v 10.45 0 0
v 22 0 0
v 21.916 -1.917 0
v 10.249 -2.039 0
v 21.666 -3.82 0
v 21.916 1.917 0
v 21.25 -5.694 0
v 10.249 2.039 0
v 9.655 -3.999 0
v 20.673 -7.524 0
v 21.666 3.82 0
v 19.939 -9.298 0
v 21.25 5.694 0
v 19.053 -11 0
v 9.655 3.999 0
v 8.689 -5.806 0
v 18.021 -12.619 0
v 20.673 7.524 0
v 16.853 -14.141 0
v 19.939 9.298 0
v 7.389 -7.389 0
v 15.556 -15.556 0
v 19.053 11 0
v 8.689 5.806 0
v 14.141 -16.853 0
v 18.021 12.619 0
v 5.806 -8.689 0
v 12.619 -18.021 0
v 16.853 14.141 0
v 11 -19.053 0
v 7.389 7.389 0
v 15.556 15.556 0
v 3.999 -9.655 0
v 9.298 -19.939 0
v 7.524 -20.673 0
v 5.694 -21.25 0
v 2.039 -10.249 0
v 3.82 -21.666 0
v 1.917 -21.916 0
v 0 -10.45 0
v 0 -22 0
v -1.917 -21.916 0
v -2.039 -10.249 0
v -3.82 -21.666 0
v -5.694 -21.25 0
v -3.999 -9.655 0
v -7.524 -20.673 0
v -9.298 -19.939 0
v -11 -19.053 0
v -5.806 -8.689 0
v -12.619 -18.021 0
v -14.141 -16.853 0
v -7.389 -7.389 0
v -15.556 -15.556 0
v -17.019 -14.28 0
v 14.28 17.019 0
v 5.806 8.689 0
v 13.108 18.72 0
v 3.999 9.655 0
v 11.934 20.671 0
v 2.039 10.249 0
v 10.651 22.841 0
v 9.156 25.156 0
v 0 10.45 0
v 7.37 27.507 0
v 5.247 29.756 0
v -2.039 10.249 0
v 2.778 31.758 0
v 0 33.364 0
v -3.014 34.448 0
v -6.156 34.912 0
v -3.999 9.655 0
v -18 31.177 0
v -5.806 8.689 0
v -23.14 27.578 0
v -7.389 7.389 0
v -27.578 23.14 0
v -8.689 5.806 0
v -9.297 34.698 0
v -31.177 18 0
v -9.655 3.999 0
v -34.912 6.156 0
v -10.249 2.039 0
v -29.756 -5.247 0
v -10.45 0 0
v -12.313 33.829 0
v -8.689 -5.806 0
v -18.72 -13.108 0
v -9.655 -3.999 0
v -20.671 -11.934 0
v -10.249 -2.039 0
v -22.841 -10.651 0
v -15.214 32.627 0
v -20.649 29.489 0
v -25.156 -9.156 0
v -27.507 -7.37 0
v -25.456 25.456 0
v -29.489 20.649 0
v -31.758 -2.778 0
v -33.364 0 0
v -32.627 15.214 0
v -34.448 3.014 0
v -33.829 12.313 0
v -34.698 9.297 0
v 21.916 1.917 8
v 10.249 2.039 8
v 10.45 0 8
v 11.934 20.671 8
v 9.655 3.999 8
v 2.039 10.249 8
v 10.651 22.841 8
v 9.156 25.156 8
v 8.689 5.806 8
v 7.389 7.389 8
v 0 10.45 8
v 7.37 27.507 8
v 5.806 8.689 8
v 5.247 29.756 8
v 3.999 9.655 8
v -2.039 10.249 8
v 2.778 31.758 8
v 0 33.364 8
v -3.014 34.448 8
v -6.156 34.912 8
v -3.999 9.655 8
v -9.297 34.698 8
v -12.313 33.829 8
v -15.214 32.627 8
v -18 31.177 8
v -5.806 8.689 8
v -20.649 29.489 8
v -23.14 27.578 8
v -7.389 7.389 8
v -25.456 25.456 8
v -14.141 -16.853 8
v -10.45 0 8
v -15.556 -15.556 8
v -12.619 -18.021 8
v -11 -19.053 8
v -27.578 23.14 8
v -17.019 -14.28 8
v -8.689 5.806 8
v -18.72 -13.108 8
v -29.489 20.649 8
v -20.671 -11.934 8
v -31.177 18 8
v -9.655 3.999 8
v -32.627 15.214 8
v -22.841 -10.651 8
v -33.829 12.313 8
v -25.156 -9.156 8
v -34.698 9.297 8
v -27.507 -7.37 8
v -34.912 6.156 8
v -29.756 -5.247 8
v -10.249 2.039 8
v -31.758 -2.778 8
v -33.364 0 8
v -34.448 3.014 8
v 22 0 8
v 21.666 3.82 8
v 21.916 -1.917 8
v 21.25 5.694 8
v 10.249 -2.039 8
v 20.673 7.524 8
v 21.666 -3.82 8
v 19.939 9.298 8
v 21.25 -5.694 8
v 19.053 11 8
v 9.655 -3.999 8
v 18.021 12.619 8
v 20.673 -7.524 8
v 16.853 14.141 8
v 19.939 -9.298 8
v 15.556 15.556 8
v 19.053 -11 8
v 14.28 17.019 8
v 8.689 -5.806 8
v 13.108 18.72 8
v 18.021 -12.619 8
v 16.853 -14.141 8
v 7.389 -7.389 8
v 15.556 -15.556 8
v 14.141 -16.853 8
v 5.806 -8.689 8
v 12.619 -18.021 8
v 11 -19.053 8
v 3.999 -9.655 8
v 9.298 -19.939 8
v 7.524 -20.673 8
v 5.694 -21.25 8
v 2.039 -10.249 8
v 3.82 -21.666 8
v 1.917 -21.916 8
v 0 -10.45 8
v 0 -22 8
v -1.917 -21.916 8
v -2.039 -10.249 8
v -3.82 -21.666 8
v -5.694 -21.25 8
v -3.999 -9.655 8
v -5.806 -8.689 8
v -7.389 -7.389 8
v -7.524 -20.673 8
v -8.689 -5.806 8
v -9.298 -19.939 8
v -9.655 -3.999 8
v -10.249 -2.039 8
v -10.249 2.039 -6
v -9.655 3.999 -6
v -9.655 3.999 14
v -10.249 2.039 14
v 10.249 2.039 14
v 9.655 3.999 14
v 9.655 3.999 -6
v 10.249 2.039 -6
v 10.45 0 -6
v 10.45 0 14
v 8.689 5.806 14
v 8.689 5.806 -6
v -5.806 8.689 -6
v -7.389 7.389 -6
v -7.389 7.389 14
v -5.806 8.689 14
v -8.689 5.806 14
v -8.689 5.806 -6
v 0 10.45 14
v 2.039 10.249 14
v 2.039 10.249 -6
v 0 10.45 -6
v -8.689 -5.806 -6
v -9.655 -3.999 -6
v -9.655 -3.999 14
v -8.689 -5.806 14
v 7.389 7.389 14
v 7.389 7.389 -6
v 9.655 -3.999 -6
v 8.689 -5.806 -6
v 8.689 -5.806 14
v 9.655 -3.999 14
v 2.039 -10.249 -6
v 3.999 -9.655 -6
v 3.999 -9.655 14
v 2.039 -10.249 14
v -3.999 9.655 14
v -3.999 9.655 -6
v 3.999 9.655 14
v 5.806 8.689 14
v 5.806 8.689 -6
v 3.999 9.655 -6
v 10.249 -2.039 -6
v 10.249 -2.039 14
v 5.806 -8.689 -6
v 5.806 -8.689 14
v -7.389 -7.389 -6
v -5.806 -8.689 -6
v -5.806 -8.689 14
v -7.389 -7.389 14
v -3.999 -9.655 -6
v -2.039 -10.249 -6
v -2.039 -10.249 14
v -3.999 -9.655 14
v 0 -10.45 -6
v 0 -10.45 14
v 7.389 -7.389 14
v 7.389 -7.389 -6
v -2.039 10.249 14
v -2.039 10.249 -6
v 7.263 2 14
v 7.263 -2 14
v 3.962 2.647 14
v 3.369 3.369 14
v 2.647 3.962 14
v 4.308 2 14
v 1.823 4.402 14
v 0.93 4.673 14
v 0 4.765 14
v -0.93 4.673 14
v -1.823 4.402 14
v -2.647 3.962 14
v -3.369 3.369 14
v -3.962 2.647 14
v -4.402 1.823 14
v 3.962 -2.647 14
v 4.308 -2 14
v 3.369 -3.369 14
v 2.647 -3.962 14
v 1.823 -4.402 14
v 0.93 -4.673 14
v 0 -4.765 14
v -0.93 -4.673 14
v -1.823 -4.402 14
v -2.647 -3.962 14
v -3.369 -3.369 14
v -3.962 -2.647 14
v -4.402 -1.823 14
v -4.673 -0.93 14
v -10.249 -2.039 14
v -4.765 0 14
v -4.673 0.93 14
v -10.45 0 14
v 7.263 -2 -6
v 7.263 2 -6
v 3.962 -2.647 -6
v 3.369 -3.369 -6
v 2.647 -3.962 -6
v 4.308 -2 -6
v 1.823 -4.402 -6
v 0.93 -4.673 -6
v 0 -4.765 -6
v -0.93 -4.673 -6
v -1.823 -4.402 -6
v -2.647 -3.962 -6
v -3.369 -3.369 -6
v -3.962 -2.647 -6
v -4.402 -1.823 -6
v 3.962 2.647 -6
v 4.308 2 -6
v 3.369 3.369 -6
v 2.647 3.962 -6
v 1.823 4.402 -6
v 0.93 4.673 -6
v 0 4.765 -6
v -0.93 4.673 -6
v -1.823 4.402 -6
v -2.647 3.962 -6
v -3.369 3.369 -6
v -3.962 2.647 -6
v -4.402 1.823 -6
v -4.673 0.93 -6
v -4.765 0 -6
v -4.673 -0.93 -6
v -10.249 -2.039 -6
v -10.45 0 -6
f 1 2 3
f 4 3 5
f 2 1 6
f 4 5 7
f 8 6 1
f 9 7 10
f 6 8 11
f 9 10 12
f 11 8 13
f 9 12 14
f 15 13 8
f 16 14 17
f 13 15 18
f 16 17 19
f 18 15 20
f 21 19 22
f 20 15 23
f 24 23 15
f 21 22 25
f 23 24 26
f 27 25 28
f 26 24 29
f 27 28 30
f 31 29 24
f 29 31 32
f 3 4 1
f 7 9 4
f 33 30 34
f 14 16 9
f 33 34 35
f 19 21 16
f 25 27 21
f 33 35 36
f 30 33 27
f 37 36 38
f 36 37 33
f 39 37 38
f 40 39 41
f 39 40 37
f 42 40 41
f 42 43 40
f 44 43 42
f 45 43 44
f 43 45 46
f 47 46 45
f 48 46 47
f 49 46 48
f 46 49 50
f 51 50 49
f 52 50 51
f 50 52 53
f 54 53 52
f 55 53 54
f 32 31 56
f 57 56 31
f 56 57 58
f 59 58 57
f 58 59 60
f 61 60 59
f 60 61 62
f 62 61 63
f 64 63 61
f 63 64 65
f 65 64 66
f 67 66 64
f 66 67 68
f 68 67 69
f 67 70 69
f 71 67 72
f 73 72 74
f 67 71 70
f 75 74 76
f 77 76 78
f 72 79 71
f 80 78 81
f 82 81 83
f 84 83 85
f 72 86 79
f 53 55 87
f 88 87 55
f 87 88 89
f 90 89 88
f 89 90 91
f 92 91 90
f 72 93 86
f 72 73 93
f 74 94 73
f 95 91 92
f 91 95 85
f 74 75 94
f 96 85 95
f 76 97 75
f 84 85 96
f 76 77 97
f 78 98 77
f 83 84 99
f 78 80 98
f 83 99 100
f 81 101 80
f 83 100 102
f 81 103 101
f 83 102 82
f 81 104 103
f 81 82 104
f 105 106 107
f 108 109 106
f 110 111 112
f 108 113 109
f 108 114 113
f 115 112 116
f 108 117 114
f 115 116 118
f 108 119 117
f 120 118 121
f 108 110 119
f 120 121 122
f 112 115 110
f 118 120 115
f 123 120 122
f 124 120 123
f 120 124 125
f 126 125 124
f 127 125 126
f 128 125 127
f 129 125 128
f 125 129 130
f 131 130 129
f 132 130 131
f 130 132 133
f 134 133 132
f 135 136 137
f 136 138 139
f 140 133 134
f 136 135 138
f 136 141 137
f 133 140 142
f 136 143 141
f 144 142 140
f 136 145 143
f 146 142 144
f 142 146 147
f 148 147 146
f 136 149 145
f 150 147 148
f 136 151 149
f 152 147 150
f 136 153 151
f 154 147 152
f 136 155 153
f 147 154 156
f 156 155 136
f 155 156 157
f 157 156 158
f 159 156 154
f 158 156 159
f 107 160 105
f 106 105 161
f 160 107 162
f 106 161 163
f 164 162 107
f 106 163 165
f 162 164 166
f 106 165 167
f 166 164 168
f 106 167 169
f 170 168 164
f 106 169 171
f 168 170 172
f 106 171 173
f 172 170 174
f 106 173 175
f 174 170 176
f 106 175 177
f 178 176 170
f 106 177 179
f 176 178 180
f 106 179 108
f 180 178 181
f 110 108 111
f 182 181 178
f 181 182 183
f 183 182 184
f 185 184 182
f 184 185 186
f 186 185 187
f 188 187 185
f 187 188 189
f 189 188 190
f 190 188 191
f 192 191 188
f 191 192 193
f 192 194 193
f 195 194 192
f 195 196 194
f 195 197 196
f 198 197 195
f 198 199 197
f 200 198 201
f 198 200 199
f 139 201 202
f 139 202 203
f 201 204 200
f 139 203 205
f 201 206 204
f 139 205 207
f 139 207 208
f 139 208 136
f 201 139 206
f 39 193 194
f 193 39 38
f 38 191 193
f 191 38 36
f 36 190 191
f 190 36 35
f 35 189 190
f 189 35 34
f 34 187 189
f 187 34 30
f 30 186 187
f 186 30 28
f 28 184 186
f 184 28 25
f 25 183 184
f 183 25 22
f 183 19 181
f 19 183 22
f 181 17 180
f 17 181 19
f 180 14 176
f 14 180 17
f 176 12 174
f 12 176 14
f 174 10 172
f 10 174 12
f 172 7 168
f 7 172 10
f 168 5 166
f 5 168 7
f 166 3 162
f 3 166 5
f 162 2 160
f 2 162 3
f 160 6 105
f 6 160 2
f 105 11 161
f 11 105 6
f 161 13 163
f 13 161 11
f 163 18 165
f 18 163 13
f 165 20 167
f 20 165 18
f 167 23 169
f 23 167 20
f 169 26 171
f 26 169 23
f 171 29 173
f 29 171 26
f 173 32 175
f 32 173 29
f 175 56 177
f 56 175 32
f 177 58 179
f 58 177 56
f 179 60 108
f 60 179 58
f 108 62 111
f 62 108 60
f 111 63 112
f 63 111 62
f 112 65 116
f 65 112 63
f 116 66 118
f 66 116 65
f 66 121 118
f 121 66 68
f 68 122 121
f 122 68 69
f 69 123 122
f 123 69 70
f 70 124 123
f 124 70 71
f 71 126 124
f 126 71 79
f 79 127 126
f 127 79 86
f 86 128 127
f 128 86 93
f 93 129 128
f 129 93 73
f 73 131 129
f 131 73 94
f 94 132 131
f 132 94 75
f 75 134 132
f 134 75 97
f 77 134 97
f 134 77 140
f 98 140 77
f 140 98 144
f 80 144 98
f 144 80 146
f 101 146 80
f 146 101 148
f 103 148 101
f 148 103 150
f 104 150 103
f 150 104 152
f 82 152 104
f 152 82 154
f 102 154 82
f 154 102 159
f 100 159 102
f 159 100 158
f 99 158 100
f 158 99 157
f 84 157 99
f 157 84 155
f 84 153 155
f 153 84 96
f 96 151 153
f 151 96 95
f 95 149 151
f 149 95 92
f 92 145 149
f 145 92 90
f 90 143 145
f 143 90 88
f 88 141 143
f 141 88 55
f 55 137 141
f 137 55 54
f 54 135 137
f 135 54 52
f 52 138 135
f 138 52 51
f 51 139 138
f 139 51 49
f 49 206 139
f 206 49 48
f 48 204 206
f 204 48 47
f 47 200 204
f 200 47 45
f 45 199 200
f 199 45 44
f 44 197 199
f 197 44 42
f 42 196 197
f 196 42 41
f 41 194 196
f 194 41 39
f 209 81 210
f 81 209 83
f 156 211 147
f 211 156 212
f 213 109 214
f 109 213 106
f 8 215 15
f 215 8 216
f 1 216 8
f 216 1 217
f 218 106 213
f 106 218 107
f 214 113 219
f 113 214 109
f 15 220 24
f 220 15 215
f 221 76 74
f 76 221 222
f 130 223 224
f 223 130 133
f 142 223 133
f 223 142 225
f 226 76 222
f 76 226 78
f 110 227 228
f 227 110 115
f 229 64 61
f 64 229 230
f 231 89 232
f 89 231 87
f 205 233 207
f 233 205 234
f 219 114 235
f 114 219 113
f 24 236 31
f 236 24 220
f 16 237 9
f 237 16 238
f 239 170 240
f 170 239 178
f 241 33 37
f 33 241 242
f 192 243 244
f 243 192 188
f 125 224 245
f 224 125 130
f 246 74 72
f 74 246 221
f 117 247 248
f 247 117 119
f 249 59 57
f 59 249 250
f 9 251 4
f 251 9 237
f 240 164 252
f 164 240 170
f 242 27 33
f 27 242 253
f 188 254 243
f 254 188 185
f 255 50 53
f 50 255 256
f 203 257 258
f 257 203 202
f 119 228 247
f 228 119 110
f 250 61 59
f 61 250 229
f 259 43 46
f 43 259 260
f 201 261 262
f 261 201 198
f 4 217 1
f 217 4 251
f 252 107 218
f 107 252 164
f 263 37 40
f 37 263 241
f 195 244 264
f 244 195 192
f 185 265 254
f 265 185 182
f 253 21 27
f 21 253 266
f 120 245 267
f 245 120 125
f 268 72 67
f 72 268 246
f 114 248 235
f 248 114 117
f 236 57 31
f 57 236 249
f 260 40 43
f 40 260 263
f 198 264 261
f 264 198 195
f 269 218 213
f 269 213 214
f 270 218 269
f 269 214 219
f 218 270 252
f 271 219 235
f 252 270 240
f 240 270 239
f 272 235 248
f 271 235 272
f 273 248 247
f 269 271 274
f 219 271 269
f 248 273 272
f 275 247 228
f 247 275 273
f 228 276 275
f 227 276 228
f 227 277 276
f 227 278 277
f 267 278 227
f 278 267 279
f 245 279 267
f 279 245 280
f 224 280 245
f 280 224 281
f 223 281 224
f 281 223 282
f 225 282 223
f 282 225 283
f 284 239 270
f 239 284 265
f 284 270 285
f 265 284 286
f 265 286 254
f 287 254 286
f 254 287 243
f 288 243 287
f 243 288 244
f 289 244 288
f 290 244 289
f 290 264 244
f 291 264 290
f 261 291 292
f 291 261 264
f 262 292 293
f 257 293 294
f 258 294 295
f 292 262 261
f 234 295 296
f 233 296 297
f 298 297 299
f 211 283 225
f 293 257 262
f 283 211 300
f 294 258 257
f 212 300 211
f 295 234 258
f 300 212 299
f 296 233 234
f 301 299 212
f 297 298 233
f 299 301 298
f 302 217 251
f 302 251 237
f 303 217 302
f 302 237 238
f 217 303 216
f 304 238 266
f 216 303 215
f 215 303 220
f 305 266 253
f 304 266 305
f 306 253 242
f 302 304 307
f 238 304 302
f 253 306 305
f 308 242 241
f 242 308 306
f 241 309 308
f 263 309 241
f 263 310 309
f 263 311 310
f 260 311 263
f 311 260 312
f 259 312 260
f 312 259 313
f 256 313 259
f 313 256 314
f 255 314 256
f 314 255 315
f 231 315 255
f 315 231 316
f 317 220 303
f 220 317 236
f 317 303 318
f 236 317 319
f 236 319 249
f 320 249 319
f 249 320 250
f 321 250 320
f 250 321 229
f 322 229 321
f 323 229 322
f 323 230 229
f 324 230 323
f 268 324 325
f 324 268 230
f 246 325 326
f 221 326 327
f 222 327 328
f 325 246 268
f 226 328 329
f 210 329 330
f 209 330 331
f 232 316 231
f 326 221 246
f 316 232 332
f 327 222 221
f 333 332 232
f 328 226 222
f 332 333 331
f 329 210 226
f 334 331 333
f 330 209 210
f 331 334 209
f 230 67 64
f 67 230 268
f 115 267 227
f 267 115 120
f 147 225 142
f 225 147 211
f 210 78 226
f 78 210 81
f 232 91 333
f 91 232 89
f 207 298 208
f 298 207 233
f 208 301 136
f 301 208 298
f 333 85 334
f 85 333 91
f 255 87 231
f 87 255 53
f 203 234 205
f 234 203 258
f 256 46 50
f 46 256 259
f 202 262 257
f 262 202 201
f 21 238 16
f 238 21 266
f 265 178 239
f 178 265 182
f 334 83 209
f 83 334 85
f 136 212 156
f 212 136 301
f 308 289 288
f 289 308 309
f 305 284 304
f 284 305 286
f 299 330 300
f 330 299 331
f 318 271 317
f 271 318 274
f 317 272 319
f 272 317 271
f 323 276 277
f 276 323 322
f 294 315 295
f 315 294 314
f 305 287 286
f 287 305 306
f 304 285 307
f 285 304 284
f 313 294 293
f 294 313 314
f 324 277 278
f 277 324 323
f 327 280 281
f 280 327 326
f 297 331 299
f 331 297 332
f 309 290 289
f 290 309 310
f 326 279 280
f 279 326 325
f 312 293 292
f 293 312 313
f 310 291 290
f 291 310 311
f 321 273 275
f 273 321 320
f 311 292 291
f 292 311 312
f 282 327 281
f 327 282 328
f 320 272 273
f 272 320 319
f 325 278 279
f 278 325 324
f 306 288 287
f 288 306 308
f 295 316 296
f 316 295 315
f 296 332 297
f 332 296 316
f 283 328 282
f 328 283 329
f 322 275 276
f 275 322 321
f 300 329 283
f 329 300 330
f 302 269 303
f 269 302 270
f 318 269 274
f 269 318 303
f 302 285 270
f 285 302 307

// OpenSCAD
$fn = 32;

// ----------------------------------------------------------------------
// Cam: base radius 22 mm with a 14 mm lift over 180 degrees
// ----------------------------------------------------------------------

// --- parameters (mm) ---
base_r = 22;              // base radius
lift = 14;                // lift height above the base radius
lift_span = 180;          // angular width of the lift
lift_start = 45;          // angle where the lift starts
cam_t = 8;                // cam plate thickness
hub_d = 20.9;             // hub diameter
hub_h = 20;               // hub height
bore_d = 9.53;            // bore
key_w = 4;                // keyway width
key_depth = 2;            // keyway depth

cam_profile = [[22, 0], [21.916, 1.917], [21.666, 3.82], [21.25, 5.694], [20.673, 7.524], [19.939, 9.298], [19.053, 11], [18.021, 12.619], [16.853, 14.141], [15.556, 15.556], [14.28, 17.019], [13.108, 18.72], [11.934, 20.671], [10.651, 22.841], [9.156, 25.156], [7.37, 27.507], [5.247, 29.756], [2.778, 31.758], [0, 33.364], [-3.014, 34.448], [-6.156, 34.912], [-9.297, 34.698], [-12.313, 33.829], [-15.214, 32.627], [-18, 31.177], [-20.649, 29.489], [-23.14, 27.578], [-25.456, 25.456], [-27.578, 23.14], [-29.489, 20.649], [-31.177, 18], [-32.627, 15.214], [-33.829, 12.313], [-34.698, 9.297], [-34.912, 6.156], [-34.448, 3.014], [-33.364, 0], [-31.758, -2.778], [-29.756, -5.247], [-27.507, -7.37], [-25.156, -9.156], [-22.841, -10.651], [-20.671, -11.934], [-18.72, -13.108], [-17.019, -14.28], [-15.556, -15.556], [-14.141, -16.853], [-12.619, -18.021], [-11, -19.053], [-9.298, -19.939], [-7.524, -20.673], [-5.694, -21.25], [-3.82, -21.666], [-1.917, -21.916], [0, -22], [1.917, -21.916], [3.82, -21.666], [5.694, -21.25], [7.524, -20.673], [9.298, -19.939], [11, -19.053], [12.619, -18.021], [14.141, -16.853], [15.556, -15.556], [16.853, -14.141], [18.021, -12.619], [19.053, -11], [19.939, -9.298], [20.673, -7.524], [21.25, -5.694], [21.666, -3.82], [21.916, -1.917]];

difference() {
  union() {
    linear_extrude(height = cam_t) polygon(cam_profile);
    /* hub, proud of the cam plate on both sides */
    translate([0, 0, -6]) cylinder(h = hub_h, d = hub_d);
  }
  /* bore through the hub, 2.5 mm clear on both faces */
  translate([0, 0, -8.5]) cylinder(h = hub_h + 5, d = bore_d);
  /* keyway, milled through the whole hub */
  translate([2.763, -2, -8.5]) cube([4.5, 4, 25]);
}
